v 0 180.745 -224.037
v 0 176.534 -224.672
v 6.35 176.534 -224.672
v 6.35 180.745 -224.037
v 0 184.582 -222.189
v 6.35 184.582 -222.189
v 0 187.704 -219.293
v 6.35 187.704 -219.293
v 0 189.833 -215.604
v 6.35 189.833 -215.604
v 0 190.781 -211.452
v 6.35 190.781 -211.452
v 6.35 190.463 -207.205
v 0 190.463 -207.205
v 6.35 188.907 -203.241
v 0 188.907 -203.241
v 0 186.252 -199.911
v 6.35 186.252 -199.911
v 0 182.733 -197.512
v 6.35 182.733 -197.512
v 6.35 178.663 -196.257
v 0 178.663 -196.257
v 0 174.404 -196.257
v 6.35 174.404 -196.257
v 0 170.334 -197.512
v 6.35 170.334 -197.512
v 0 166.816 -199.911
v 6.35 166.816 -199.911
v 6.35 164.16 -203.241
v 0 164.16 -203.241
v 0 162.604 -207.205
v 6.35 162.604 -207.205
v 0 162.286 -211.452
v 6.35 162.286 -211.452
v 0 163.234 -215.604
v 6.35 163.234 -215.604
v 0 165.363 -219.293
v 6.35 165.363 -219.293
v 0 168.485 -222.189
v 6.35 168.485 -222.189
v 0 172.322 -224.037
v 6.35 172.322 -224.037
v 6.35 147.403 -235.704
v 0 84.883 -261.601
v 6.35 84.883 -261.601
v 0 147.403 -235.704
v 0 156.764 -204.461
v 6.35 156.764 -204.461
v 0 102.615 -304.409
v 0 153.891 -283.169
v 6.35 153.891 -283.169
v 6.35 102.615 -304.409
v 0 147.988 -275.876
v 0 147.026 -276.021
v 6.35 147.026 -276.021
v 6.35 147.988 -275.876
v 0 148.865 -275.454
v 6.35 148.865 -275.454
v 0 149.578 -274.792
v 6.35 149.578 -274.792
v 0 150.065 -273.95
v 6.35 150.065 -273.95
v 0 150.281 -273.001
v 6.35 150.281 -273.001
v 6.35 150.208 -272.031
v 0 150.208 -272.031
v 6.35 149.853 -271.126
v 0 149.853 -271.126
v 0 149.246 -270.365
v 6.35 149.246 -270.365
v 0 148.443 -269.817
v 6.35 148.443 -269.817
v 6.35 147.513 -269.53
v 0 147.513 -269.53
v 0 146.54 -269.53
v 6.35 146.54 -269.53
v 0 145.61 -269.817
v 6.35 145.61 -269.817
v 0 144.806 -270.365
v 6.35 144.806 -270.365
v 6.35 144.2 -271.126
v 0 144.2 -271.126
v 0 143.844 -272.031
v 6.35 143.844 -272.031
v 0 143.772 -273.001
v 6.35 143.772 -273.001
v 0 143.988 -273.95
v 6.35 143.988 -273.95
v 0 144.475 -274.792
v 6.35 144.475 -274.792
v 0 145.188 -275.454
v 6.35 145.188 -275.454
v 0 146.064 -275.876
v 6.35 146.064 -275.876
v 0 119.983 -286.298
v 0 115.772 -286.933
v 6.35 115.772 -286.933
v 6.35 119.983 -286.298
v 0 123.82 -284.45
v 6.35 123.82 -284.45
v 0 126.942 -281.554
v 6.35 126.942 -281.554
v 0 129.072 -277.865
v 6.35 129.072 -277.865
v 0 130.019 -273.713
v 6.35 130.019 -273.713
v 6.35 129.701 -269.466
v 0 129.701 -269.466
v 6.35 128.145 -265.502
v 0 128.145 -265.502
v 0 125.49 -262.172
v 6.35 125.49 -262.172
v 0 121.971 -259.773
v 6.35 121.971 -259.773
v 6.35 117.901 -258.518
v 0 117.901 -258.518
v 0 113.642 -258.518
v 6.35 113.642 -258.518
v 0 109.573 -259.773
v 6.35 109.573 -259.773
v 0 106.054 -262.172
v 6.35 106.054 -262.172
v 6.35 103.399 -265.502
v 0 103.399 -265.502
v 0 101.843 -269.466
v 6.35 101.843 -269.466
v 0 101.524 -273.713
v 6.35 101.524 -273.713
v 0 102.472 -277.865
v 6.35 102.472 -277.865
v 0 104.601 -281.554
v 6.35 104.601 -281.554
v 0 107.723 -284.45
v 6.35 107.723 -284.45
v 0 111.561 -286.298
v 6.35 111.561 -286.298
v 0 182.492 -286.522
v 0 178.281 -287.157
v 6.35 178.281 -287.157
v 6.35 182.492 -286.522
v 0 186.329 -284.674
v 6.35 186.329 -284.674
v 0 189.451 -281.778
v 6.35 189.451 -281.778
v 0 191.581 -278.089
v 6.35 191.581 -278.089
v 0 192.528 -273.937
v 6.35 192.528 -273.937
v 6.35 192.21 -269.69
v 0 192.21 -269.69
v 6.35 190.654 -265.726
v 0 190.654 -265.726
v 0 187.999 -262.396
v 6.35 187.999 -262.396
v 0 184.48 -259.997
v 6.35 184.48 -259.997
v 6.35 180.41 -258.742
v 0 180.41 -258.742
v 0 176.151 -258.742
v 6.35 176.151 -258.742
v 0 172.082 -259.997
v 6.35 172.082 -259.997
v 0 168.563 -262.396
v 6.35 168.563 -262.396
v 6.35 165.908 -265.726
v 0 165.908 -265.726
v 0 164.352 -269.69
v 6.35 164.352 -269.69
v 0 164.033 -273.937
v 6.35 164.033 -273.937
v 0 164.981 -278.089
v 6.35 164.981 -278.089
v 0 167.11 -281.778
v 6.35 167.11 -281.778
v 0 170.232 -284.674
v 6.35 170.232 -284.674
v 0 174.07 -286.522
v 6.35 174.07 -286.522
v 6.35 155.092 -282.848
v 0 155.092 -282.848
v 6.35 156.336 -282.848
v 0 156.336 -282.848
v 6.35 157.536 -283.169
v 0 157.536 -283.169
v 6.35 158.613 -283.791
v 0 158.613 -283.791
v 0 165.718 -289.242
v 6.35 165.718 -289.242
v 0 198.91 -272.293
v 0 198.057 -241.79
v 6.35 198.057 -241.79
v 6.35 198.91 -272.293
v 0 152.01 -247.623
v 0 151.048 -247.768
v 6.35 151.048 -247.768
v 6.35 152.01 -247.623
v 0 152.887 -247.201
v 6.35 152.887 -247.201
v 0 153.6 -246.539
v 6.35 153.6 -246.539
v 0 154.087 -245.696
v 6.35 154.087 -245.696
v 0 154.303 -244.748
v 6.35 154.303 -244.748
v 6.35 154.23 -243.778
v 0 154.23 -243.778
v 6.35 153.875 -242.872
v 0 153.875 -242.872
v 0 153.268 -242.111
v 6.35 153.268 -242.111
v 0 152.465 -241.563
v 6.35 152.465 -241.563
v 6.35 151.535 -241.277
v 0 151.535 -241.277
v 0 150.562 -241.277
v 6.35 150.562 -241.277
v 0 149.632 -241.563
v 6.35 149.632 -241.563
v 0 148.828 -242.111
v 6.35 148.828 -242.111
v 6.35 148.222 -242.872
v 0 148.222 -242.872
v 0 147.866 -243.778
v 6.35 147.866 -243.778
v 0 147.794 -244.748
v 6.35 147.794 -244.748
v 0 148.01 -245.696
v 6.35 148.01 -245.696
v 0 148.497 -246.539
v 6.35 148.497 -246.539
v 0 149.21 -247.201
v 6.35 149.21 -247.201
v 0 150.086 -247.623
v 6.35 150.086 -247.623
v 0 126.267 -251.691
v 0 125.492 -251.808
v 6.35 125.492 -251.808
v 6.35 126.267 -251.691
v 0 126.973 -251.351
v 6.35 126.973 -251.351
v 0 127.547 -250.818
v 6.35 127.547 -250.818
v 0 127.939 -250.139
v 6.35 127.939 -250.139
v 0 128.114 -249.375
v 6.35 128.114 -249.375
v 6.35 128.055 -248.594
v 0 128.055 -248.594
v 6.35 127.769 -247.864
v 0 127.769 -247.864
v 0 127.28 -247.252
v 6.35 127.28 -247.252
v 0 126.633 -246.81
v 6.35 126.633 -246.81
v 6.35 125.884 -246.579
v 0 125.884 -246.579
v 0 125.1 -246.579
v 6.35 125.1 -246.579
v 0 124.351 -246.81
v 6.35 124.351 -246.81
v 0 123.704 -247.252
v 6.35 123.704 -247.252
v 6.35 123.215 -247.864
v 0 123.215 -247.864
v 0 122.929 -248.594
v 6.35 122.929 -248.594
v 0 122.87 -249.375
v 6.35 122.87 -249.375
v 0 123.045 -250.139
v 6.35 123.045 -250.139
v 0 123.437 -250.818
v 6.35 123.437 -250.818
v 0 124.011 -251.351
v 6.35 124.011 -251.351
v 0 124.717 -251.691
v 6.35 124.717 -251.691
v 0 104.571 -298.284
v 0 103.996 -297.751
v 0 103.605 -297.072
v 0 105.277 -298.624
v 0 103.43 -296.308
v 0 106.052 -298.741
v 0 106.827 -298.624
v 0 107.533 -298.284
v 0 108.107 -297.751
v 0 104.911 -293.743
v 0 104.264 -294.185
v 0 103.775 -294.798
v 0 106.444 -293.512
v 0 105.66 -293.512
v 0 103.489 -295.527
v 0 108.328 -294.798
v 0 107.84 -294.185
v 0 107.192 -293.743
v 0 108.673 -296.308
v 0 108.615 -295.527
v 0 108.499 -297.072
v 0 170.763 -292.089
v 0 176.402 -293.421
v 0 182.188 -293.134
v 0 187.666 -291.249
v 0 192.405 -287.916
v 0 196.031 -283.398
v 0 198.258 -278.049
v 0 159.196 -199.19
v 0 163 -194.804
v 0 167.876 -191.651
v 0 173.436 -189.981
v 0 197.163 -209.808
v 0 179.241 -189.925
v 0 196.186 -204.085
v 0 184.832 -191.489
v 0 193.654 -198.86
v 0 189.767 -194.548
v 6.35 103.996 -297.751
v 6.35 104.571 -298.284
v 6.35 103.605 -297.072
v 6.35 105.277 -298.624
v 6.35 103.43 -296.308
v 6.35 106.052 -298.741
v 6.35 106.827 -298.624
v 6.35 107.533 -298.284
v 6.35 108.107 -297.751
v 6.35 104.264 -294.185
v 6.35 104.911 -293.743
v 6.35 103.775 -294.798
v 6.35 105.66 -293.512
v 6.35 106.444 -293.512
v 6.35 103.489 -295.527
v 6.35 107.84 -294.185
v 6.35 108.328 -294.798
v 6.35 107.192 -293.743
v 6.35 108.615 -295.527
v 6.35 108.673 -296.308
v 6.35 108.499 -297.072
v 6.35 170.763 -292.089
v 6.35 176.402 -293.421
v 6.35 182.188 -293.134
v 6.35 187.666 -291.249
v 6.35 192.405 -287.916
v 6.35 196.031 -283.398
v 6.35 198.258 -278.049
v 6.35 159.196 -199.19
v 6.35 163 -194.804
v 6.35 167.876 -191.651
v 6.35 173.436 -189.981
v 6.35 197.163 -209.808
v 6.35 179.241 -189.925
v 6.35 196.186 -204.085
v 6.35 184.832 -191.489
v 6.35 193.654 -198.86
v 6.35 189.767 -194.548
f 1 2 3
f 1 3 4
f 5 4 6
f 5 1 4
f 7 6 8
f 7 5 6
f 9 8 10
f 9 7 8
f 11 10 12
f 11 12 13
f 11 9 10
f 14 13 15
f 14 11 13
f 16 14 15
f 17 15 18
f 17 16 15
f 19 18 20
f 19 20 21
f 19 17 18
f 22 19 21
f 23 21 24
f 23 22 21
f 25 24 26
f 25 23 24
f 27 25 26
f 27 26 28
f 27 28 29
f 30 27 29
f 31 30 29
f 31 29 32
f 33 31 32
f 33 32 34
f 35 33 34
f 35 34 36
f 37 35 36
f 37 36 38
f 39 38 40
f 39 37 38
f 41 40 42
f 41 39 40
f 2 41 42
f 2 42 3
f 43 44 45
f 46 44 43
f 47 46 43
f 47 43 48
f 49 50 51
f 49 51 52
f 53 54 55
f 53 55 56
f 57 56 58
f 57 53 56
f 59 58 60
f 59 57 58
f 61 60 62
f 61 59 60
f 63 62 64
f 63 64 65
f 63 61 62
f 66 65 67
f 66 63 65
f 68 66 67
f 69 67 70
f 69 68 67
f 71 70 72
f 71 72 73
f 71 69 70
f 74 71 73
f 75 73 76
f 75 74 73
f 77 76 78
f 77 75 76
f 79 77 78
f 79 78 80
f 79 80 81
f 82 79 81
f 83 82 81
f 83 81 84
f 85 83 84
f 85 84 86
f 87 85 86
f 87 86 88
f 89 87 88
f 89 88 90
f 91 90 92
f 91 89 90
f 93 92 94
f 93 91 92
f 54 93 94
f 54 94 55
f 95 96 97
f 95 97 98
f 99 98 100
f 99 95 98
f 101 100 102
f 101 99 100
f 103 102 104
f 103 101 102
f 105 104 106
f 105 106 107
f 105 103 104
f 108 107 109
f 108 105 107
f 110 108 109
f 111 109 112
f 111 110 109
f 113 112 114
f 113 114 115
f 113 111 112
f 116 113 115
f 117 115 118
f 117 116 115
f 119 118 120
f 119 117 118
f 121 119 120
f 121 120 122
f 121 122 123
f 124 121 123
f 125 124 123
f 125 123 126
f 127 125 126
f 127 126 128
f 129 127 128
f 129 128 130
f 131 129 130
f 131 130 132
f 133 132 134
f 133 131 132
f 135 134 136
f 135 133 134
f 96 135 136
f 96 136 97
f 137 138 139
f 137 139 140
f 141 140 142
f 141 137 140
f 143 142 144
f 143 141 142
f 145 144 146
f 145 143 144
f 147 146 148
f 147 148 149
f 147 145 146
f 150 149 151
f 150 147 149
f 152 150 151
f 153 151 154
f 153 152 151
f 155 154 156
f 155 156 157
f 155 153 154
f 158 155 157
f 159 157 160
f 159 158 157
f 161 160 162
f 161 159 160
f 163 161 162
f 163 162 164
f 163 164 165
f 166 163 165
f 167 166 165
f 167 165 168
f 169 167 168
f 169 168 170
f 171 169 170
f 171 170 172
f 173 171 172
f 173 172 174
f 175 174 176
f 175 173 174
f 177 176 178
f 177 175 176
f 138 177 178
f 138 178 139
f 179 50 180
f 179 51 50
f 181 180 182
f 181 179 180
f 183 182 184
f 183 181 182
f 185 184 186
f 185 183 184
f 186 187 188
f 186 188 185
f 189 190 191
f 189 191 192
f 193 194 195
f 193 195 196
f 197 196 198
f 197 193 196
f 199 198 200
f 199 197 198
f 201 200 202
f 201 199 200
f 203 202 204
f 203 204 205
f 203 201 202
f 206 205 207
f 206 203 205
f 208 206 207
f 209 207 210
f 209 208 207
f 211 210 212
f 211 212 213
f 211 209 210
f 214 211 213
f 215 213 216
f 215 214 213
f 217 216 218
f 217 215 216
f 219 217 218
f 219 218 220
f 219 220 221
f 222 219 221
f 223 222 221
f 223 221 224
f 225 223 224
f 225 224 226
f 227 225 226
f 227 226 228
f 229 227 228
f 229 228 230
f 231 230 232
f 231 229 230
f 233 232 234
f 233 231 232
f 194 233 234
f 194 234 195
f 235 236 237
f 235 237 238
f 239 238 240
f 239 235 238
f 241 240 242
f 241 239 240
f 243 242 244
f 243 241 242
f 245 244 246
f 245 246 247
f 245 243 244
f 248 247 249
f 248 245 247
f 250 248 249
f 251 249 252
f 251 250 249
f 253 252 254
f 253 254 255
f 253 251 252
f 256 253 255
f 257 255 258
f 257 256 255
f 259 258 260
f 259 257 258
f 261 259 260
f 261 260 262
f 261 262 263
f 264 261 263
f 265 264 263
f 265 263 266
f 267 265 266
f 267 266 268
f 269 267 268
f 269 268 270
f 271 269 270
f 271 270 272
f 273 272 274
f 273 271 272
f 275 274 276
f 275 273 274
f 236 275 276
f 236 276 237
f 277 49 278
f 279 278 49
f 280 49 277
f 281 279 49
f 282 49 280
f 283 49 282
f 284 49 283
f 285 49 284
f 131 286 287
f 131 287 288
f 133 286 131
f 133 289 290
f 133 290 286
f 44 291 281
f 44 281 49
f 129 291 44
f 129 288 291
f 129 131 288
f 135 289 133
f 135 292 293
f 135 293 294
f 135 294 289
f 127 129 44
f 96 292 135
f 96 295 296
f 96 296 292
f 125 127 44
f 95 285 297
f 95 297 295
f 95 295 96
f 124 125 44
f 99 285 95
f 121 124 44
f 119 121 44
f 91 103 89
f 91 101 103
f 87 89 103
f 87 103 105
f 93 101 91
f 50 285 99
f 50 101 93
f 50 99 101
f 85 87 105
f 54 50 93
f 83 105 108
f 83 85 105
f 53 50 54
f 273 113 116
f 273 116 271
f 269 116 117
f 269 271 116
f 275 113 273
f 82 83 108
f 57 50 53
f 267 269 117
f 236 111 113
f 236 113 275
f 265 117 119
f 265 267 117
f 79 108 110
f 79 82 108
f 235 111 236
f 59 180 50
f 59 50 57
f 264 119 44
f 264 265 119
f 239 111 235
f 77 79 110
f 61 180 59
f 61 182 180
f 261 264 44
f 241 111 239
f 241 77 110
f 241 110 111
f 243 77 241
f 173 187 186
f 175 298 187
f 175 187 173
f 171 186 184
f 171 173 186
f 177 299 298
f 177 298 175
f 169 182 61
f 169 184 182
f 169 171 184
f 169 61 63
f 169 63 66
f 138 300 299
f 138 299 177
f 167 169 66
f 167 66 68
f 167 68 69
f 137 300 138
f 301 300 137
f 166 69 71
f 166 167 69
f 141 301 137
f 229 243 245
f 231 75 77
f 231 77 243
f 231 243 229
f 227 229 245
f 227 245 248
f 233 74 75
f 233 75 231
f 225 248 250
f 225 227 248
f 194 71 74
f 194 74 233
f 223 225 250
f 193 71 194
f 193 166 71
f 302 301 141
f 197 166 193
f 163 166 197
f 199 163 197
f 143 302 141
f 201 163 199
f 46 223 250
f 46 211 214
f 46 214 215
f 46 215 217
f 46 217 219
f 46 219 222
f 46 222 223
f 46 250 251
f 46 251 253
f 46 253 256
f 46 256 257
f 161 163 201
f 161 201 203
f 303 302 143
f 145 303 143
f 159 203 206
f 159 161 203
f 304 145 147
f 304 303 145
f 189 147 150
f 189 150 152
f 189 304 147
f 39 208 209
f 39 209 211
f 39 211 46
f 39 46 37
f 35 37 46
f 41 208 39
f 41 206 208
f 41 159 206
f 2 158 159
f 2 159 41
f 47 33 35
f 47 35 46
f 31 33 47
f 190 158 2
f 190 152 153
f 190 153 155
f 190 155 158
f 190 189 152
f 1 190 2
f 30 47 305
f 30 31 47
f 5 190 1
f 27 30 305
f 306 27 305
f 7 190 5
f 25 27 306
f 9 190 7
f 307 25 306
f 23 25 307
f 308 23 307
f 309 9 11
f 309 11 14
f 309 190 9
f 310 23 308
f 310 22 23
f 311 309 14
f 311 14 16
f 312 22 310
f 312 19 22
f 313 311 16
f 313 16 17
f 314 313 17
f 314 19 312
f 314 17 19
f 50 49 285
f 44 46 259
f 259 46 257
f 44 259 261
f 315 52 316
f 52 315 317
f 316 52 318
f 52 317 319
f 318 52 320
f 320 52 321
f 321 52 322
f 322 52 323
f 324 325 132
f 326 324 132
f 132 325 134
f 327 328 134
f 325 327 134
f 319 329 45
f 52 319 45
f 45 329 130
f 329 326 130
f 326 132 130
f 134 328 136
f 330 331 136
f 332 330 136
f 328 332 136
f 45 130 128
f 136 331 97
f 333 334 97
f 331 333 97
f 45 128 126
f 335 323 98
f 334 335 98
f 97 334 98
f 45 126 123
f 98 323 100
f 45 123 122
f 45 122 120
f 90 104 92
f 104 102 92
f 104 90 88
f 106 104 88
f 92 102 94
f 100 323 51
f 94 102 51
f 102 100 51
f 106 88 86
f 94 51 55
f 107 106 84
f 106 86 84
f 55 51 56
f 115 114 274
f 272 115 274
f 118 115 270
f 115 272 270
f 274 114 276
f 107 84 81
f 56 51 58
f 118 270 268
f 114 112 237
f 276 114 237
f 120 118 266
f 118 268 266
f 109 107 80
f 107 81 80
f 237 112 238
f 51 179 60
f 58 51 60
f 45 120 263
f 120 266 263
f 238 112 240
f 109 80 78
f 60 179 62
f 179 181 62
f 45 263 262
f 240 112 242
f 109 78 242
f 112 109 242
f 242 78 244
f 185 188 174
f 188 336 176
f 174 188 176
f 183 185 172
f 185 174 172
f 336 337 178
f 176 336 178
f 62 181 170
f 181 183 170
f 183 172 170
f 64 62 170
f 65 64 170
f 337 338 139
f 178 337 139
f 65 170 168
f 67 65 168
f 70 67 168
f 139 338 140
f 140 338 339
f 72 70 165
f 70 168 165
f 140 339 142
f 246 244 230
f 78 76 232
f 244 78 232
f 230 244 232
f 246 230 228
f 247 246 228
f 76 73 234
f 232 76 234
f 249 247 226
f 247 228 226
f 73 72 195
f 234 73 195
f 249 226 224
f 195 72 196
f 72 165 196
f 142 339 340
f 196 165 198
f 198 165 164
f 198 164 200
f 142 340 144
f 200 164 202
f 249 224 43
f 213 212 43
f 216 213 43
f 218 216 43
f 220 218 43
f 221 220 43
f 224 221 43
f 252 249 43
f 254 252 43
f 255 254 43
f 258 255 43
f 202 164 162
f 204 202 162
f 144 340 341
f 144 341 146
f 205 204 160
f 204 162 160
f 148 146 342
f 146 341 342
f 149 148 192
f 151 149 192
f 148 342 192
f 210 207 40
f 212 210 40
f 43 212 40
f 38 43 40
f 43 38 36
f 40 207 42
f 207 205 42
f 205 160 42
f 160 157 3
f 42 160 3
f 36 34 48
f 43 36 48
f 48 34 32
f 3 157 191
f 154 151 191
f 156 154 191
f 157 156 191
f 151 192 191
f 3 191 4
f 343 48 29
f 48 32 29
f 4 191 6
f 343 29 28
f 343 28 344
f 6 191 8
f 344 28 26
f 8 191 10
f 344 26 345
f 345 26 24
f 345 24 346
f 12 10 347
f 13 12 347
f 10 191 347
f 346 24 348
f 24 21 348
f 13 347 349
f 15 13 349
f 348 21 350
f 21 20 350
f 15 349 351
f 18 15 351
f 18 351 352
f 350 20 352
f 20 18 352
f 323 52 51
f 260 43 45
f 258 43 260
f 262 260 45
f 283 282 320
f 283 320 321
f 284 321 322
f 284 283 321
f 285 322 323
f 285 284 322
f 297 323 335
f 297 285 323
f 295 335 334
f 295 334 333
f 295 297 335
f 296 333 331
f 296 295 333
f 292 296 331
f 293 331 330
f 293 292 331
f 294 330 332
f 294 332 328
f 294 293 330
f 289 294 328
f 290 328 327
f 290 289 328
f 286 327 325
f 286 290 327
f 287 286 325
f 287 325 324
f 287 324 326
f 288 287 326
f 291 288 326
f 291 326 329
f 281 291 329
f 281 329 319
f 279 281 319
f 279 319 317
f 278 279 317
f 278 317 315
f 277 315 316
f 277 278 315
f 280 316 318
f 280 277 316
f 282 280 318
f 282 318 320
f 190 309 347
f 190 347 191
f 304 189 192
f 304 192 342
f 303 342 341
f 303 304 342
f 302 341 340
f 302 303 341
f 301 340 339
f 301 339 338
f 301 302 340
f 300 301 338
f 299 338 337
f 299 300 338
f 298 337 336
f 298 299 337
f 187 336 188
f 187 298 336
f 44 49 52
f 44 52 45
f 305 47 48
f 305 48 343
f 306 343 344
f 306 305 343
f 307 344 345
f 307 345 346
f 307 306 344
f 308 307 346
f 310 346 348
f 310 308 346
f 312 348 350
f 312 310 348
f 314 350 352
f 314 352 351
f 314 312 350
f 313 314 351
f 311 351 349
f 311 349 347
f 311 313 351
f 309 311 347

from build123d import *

# Parameters (mm, degrees)
SKETCH1_R           = 2.6289
SKETCH1_R_2         = 14.2875
SKETCH1_R_3         = 3.2639
BOSS_EXTRUDE1_DEPTH = 6.35
FILLET1_R           = 4.7625


with BuildPart() as part:
    # Sketch1 → Boss-Extrude1 (new body)
    with BuildSketch(Plane(origin=(0, 0, 0), x_dir=(0, 0, -1), z_dir=(1, 0, 0))):
        with BuildLine():
            Line((261.600661049, 84.883471899), (235.704081281, 147.403346332))
            Line((235.704081281, 147.403346332), (204.461245323, 156.764386521))
            ThreePointArc((204.461245323, 156.764386521), (189.925416447, 179.241173024), (209.807662792, 197.163018154))
            Line((209.807662792, 197.163018154), (241.790461139, 198.057364052))
            Line((241.790461139, 198.057364052), (272.292637552, 198.910306814))
            ThreePointArc((272.292637552, 198.910306814), (291.249324985, 187.666425791), (289.242335043, 165.717556793))
            Line((289.242335043, 165.717556793), (282.117070677, 156.43173152))
            Line((282.117070677, 156.43173152), (304.408641761, 102.615117992))
            Line((304.408641761, 102.615117992), (261.600661049, 84.883471899))
        make_face()
        with Locations((296.111966941, 106.051713243)):
            Circle(SKETCH1_R, mode=Mode.SUBTRACT)
        with Locations((249.178886841, 125.492031649)):
            Circle(SKETCH1_R, mode=Mode.SUBTRACT)
        with Locations((272.645426891, 115.771872446)):
            Circle(SKETCH1_R_2, mode=Mode.SUBTRACT)
        with Locations((210.384530747, 176.533582155)):
            Circle(SKETCH1_R_2, mode=Mode.SUBTRACT)
        with Locations((272.869505507, 178.280870816)):
            Circle(SKETCH1_R_2, mode=Mode.SUBTRACT)
        with Locations((272.757466199, 147.026371631)):
            Circle(SKETCH1_R_3, mode=Mode.SUBTRACT)
        with Locations((244.504033835, 151.048406008)):
            Circle(SKETCH1_R_3, mode=Mode.SUBTRACT)
    extrude(amount=BOSS_EXTRUDE1_DEPTH)

    # Fillet1
    fillet1_edges = [part.edges().sort_by_distance(p)[0] for p in [
        (3.175, 156.43173152, -282.117070677),
    ]]
    fillet(fillet1_edges, radius=FILLET1_R)


solid = part.part
